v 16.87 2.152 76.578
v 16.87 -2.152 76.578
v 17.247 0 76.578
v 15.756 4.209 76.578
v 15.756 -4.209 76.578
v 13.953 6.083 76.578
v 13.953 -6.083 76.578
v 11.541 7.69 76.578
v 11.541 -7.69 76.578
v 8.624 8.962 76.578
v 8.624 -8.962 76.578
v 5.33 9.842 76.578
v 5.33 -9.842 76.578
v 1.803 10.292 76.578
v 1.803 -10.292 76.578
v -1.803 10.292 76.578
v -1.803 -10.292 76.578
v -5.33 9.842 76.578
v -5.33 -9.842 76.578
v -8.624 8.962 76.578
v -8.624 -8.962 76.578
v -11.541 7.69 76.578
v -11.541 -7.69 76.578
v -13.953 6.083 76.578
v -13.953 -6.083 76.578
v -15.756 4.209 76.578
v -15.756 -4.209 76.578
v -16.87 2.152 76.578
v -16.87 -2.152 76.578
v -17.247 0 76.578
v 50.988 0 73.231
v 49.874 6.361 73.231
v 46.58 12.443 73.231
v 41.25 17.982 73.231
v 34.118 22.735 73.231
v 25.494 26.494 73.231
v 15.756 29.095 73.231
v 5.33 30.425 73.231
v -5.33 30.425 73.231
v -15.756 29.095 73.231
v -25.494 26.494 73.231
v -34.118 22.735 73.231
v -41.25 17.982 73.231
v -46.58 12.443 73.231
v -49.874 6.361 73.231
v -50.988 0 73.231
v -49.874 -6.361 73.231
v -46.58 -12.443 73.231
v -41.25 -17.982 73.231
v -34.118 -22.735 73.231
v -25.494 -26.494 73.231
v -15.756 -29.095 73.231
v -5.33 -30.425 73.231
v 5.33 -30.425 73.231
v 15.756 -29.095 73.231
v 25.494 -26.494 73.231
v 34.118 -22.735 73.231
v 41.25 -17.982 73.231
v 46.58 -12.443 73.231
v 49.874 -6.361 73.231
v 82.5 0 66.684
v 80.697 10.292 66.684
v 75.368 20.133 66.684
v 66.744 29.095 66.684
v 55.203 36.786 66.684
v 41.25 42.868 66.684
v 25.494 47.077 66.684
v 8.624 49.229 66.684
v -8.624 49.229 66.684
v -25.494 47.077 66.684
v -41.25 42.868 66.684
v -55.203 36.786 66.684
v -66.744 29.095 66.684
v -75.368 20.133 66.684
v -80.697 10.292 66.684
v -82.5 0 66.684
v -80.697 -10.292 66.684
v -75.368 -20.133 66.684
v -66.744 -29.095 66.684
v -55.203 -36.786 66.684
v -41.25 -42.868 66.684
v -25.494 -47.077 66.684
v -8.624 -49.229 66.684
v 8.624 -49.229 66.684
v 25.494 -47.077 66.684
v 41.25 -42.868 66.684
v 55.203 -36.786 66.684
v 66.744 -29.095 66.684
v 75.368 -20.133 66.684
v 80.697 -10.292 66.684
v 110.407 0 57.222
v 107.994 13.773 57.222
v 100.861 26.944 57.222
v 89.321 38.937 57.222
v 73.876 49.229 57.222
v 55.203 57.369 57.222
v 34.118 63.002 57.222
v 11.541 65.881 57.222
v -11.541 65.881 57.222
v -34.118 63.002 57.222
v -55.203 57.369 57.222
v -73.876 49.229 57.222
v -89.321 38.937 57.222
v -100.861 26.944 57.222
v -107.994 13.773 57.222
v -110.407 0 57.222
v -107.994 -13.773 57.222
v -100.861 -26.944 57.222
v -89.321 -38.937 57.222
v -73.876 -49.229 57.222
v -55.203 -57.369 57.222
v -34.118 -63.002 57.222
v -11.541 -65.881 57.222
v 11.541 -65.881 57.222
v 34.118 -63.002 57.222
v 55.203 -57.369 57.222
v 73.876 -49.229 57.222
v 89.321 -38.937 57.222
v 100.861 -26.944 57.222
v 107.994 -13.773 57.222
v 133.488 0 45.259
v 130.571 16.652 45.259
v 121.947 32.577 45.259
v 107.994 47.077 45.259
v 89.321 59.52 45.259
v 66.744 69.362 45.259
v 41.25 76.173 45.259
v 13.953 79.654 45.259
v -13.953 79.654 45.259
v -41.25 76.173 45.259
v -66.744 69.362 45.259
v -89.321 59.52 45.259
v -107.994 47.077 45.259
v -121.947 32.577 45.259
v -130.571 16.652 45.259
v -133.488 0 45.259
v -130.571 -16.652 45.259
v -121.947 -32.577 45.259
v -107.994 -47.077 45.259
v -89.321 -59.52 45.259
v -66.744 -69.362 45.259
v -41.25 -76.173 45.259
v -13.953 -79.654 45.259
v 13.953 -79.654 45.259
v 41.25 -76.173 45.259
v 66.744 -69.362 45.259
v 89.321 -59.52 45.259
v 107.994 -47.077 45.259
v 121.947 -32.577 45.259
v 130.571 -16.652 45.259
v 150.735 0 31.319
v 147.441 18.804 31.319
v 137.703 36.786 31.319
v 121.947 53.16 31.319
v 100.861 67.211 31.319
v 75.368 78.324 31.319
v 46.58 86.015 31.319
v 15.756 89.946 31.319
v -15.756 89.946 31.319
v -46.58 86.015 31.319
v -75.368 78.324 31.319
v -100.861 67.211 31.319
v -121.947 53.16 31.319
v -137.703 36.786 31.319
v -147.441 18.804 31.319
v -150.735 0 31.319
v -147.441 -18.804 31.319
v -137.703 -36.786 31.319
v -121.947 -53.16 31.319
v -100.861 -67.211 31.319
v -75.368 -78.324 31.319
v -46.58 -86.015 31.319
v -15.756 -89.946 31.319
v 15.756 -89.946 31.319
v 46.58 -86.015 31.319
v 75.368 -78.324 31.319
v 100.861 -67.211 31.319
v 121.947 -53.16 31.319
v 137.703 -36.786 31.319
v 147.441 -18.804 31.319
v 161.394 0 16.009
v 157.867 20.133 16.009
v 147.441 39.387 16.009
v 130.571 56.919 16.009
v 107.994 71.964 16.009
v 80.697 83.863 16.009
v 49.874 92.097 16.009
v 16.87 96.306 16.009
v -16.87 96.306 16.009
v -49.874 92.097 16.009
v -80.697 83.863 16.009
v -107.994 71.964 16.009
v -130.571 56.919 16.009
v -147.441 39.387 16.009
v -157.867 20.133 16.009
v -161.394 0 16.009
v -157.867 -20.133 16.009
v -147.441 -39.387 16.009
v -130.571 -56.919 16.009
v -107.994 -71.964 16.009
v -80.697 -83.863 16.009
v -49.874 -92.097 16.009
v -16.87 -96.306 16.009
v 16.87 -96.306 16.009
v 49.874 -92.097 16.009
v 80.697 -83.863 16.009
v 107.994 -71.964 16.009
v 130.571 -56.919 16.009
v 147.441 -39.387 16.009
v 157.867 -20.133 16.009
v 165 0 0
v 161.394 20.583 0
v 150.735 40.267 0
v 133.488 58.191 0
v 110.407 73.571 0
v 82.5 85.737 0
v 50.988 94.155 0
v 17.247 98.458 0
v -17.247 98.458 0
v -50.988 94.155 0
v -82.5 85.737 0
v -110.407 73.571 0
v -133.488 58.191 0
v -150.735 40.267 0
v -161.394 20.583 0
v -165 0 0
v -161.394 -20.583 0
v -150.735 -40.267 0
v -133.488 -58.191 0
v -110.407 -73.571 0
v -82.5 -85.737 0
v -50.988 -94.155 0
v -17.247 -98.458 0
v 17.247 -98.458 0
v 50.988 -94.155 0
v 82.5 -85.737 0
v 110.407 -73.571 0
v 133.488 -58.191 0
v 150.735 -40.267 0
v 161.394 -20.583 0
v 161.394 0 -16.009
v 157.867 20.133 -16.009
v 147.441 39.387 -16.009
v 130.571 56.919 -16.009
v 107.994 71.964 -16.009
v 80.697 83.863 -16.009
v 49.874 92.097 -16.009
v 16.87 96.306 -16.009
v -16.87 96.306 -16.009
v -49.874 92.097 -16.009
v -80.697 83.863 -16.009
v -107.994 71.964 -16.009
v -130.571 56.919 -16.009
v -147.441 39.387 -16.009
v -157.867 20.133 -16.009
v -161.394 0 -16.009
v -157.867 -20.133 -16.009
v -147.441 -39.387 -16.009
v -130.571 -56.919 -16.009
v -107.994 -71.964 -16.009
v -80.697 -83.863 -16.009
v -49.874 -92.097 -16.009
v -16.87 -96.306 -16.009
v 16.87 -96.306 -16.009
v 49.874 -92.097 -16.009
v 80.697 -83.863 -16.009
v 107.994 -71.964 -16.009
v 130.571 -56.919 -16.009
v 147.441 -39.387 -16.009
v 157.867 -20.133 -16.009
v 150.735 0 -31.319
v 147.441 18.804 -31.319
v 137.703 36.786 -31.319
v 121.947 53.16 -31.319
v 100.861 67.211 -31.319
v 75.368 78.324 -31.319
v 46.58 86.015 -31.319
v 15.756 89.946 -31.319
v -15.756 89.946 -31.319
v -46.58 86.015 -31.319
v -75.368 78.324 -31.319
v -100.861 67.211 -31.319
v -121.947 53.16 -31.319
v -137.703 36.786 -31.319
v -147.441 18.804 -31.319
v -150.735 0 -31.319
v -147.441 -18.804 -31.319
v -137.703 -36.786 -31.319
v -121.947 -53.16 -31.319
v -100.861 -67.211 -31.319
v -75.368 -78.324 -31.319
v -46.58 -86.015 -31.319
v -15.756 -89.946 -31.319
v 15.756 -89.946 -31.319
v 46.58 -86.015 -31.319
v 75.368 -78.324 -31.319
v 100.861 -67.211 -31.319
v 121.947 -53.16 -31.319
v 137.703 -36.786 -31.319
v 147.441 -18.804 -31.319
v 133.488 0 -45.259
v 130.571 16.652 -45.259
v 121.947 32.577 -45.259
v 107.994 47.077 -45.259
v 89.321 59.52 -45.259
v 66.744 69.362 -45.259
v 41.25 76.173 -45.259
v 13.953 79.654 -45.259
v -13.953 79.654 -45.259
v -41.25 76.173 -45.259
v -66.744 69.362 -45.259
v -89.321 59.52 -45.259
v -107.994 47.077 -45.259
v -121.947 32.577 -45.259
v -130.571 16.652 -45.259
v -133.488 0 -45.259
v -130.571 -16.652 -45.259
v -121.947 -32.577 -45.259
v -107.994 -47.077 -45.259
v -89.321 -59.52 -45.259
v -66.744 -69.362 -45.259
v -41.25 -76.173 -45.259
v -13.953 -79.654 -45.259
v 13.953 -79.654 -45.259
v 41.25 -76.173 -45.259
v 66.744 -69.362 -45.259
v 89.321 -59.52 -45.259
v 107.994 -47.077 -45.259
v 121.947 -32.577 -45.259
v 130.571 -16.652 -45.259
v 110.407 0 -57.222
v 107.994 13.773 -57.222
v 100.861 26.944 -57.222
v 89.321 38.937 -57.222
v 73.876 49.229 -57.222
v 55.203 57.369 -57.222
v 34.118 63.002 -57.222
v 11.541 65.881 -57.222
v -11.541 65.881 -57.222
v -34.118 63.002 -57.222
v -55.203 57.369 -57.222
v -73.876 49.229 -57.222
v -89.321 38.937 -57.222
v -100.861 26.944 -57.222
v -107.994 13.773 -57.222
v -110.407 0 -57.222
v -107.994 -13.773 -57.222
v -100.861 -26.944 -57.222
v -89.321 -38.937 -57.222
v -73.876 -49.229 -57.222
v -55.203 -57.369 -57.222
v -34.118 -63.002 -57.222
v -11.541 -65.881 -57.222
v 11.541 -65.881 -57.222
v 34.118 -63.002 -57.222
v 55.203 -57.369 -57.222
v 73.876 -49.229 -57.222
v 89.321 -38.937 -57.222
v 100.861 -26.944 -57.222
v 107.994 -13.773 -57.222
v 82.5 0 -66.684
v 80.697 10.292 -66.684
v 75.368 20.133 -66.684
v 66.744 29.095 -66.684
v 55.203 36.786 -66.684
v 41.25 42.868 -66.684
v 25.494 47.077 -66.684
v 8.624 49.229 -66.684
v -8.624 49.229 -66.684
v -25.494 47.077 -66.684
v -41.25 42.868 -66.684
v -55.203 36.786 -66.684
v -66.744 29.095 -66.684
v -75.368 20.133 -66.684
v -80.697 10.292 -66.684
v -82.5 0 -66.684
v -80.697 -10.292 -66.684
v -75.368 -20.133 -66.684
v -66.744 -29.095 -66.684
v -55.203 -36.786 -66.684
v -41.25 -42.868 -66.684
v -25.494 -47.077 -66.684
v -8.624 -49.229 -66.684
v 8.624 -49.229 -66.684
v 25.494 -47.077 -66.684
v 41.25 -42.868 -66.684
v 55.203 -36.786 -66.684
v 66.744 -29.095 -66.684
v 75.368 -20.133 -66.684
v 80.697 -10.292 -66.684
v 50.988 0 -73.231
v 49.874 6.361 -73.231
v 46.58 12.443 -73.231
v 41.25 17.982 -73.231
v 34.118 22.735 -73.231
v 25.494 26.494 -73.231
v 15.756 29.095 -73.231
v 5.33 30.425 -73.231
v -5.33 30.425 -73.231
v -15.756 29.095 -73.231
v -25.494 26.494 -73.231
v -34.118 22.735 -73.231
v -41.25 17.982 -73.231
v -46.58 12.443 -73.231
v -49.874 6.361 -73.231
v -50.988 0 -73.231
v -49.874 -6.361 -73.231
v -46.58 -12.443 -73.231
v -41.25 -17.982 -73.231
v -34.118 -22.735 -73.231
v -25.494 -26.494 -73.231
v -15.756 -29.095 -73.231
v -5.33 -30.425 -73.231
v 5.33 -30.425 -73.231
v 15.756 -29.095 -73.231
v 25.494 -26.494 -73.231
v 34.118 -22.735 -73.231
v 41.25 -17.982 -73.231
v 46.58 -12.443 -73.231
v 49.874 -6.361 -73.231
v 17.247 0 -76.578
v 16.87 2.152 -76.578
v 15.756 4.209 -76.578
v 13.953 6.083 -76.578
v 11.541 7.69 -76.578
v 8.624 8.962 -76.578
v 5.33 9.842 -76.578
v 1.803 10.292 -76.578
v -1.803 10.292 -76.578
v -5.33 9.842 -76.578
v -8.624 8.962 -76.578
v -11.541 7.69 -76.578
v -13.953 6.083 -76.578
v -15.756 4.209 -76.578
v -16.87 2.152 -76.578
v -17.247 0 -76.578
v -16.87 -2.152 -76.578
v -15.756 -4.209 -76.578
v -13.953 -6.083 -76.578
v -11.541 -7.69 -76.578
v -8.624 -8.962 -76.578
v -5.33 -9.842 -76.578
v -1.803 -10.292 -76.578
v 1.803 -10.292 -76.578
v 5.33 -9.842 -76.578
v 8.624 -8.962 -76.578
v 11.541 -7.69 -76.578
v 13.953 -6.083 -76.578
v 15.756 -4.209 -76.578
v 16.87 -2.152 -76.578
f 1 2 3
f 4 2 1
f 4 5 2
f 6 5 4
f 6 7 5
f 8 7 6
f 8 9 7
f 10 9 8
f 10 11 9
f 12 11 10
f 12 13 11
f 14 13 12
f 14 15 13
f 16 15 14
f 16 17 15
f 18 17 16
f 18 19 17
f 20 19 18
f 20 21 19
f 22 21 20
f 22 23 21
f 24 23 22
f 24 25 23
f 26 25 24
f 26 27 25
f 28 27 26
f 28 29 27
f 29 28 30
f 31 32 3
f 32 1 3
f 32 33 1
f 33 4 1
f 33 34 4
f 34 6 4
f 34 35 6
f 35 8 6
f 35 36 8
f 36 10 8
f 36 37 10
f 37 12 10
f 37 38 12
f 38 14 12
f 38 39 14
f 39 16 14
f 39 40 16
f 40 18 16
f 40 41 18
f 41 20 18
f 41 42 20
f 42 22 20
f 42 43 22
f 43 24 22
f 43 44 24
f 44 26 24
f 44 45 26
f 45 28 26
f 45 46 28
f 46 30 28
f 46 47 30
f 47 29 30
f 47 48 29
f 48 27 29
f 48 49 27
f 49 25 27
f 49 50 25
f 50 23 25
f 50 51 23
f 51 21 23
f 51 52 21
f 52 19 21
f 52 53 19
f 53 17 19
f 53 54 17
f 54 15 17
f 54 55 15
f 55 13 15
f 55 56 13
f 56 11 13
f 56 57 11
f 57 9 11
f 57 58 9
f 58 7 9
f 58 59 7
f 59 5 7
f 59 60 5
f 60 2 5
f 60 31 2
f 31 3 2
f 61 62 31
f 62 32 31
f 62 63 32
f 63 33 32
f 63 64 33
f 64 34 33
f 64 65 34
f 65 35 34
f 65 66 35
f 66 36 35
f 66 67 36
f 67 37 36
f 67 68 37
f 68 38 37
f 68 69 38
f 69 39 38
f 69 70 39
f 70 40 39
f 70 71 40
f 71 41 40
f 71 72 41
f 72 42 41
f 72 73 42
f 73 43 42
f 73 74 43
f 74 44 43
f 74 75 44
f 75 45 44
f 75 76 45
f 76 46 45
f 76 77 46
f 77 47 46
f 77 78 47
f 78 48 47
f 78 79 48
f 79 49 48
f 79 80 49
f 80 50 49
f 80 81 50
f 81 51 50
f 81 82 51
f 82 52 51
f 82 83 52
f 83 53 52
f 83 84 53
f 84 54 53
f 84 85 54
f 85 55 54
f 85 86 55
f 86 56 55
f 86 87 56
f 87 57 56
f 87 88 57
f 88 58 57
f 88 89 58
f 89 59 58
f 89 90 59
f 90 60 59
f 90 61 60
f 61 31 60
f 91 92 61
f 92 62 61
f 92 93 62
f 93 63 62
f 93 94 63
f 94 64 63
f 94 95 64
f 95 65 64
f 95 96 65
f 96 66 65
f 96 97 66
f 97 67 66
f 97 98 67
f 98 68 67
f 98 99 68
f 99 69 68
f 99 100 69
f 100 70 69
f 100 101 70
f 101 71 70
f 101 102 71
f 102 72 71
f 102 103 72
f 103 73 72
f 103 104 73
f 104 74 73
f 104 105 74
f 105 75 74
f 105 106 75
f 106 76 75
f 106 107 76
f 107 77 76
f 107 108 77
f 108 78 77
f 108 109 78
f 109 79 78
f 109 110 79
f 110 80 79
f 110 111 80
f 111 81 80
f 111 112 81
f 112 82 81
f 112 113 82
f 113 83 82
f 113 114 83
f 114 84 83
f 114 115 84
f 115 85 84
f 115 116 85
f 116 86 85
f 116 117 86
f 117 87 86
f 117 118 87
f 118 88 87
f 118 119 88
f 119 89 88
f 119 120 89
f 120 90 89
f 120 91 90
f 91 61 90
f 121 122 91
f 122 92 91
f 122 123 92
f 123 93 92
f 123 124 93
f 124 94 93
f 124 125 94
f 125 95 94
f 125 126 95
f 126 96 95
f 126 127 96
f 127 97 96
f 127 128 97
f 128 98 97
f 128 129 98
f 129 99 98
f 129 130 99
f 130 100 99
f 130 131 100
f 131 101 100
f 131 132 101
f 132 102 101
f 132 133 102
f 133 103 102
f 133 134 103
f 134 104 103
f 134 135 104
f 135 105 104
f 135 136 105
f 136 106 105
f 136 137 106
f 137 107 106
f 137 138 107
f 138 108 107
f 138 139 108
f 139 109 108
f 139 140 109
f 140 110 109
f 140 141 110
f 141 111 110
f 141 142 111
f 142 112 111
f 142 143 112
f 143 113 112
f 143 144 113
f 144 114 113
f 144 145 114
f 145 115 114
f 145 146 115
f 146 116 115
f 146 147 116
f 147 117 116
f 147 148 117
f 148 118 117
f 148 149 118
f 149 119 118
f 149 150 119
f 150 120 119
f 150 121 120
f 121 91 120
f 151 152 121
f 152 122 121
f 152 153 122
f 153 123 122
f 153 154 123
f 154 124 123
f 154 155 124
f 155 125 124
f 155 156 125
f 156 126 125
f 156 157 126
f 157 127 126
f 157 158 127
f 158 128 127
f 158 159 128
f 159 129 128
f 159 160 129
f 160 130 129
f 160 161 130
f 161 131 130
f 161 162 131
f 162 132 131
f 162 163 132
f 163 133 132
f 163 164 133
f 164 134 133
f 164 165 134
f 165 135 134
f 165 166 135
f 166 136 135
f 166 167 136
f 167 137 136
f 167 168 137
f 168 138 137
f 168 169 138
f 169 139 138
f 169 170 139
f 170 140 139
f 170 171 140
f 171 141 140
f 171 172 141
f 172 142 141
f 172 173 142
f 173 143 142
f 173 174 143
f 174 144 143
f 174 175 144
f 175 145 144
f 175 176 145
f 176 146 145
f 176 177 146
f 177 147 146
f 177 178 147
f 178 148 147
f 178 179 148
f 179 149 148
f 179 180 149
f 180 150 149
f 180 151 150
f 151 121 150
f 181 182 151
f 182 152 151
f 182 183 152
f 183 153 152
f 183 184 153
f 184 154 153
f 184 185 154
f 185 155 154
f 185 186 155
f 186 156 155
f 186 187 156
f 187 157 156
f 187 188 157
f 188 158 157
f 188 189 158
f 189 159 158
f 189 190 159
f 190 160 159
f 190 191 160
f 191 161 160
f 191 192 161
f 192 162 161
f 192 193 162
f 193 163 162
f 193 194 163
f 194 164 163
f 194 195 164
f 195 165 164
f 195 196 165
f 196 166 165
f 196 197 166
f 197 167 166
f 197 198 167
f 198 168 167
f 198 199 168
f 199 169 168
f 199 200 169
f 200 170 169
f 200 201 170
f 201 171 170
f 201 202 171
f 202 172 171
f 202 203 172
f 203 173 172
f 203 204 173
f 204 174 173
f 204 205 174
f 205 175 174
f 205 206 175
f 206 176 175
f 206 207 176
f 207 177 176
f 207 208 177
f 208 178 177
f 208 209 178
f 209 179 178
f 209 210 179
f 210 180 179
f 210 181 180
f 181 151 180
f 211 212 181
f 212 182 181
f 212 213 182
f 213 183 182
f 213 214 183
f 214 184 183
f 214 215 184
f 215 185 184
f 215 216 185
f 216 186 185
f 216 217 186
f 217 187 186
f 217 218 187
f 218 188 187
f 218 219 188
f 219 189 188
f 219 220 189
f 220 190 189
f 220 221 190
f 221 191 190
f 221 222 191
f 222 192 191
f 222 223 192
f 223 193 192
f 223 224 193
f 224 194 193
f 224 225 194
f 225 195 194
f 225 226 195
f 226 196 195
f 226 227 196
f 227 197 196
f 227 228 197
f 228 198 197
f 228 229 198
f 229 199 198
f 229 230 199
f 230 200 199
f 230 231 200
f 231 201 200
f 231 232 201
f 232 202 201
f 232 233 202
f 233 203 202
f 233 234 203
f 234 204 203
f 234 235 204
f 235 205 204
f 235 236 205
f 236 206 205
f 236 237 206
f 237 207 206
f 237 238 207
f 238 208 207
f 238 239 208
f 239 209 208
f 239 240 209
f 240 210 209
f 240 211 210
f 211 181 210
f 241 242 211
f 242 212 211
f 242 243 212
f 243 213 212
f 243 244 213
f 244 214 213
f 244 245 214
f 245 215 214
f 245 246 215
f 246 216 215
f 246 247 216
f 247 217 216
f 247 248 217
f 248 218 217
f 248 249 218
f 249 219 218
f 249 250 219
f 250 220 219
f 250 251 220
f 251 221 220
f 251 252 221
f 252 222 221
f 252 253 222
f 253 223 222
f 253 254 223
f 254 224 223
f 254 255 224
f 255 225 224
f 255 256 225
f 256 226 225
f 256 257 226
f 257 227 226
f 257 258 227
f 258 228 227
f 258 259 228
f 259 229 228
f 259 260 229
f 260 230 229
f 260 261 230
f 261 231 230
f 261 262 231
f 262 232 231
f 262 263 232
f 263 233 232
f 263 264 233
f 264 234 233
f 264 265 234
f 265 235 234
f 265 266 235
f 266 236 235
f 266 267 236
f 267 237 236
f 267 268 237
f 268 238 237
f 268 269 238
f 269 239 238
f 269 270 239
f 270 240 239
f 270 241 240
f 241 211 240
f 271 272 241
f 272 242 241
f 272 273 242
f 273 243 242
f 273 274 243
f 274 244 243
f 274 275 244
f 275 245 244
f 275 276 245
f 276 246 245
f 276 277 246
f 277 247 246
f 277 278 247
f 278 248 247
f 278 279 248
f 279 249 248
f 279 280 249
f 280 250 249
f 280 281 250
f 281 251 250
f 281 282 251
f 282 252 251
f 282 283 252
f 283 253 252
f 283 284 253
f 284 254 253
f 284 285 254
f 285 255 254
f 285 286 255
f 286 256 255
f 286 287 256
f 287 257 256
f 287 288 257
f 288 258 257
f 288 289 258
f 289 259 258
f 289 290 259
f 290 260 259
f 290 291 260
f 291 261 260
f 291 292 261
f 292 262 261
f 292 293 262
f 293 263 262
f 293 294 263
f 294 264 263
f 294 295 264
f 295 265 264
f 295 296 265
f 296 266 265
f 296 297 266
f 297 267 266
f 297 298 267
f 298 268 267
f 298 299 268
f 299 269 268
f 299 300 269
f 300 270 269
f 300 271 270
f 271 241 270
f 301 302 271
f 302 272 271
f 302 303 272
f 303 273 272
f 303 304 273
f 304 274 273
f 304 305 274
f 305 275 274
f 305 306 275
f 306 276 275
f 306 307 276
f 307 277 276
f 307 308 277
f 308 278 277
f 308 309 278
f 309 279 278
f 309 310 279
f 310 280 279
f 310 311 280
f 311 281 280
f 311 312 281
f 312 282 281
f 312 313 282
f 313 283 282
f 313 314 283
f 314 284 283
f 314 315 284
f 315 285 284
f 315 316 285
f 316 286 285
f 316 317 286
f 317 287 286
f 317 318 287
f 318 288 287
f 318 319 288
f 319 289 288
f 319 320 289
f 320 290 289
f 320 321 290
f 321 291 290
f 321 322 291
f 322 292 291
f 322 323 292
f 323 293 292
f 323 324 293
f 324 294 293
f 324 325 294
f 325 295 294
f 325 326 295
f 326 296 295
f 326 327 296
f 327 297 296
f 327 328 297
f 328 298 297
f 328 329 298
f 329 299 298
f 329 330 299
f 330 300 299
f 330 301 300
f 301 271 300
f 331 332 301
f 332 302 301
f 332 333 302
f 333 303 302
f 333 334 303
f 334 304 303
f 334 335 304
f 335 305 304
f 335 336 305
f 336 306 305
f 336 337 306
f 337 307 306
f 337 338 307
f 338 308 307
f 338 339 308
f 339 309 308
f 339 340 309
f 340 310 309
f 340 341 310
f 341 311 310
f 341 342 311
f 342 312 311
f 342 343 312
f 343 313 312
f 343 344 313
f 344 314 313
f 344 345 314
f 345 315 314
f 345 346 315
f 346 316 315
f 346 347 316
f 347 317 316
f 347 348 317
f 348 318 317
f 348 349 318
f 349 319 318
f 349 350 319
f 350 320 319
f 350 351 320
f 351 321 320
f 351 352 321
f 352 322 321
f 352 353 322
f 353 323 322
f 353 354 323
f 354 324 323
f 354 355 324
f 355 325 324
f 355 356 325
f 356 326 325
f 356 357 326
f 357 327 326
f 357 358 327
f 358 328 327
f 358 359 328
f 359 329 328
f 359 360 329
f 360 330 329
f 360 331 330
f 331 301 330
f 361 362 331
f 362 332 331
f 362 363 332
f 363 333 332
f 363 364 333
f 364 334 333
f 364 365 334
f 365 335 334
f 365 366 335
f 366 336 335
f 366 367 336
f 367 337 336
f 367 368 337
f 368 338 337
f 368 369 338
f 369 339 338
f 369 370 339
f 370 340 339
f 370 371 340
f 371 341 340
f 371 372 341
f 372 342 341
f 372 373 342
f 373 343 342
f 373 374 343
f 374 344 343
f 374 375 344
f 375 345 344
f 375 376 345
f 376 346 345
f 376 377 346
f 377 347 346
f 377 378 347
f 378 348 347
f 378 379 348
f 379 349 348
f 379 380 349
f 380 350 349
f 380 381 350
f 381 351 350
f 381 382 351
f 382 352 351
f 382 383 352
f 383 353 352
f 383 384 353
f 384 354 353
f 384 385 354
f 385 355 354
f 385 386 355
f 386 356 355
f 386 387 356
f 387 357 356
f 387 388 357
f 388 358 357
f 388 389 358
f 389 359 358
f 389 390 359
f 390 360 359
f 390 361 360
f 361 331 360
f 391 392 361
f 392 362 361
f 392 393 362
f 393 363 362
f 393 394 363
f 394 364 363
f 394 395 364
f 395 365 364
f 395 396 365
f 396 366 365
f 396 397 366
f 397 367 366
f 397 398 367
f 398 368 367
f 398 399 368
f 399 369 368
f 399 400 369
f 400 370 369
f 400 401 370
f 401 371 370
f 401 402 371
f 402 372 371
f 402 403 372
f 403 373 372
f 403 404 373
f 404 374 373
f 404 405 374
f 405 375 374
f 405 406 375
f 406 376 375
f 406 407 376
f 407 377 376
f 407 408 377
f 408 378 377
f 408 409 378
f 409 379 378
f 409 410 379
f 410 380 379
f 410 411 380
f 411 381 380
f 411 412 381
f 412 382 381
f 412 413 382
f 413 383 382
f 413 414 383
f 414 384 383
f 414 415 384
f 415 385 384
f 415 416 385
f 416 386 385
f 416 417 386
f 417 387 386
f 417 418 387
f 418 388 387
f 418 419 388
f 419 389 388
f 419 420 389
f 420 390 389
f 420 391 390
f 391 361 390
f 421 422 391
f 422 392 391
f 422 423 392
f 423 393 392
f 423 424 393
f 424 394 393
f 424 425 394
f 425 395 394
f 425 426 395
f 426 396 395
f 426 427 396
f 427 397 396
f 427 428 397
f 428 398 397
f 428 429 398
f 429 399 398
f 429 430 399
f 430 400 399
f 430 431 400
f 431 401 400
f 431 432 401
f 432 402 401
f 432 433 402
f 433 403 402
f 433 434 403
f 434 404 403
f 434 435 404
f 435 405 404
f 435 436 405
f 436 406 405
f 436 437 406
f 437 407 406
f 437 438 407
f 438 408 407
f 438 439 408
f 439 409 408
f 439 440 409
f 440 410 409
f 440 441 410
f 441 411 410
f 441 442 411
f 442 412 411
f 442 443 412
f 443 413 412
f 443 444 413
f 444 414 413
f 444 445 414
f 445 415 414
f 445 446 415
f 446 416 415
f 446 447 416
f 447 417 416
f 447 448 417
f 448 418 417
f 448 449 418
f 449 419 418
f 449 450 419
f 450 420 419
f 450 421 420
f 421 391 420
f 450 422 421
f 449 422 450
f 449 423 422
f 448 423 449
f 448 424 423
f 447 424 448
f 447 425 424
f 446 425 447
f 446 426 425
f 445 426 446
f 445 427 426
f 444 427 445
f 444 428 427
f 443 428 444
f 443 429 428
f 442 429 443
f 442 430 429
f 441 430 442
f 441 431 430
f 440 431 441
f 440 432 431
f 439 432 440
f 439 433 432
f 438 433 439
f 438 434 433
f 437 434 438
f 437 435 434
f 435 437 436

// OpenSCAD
// Generated by SolidPython 1.0.1 on 2020-07-29 00:46:52


scale(v = [15, 9, 7]) {
	sphere(r = 11);
}
/***********************************************
*********      SolidPython code:      **********
************************************************
 
# import packages: SolidPython
from solid import *
from solid.utils import *
from itertools import chain, combinations, permutations


class Resize:

    def __init__(self, scad_file):
        self.scad_file = scad_file
        #self.scad_file = import_scad(scad_file)
        # cone/cylinder param:
        self.r1 = 0
        self.r2 = 0
        self.h = 0
        # rectangular prism param:
        self.w = 0
        self.l = 0
        # ellipse param:
        self.r = 0

    # import OpenScad code (file name corresponds to shape)


    # classify shape + parameters
    def assign(self, param1, param2, param3):
        if self.scad_file == 'cone.scad':
            self.r1 = param1
            self.r2 = param2
            self.h = param3
        elif self.scad_file == 'cylinder.scad':
            self.r1 = param1
            self.r2 = param2
            self.h = param3
        elif self.scad_file == 'rectangularPrism.scad':
            self.h = param1
            self.l = param2
            self.w = param3
        else:
            self.r = param1
            self.h = param2

    # resize parameters
    def iterate(self):
        x = range(3, 20, 2)
        i = 1
        if self.scad_file == 'cone.scad':
            tempList = list(permutations(x, 2))
            for temp in tempList:
                param1 = temp[0]
                param2 = temp[1]
                filepath = 'produced_scad_files/' + 'cone' + str(param1) + '_' + str(param2) + '_' + '.scad'
                scad_render_to_file(cylinder(h=param1, r1=param2, r2=0), filepath)

        elif self.scad_file == 'cylinder.scad':
            tempList = list(permutations(x, 3))
            for temp in tempList:
                param1 = temp[0]
                param2 = temp[1]
                filepath = 'produced_scad_files/' + 'cylinder' + str(param1) + '_' + str(param2) + '_' + '.scad'
                scad_render_to_file(cylinder(h=param1, r1=param2, r2=param2), filepath)

        elif self.scad_file == 'rectangularPrism.scad':
            tempList = list(permutations(x, 3))
            for temp in tempList:
                param1 = temp[0]
                param2 = temp[1]
                param3 = temp[2]
                filepath = 'produced_scad_files/' + 'rectangularPrism' + str(param1) + '_' + str(param2) + '_' + str(
                    param3) + '.scad'
                scad_render_to_file(cube(size=(param1, param2, param3)), filepath)

        elif self.scad_file == 'ellipse.scad':
            tempList = list(permutations(x, 4))
            for temp in tempList:
                param1 = temp[0]
                param2 = temp[1]
                param3 = temp[2]
                param4 = temp[3]
                filepath = 'produced_scad_files/' + 'ellipse' + str(param1) + '_' + str(param2) + '_' + str(param3) + '_' + str(param4) + '.scad'
                scad_render_to_file(scale([param1, param2, param3])(sphere(r=param4)), filepath)

    def render_to_scadfile(self):
        scad_render_to_file(scad, 'example.scad') 
 
************************************************/
